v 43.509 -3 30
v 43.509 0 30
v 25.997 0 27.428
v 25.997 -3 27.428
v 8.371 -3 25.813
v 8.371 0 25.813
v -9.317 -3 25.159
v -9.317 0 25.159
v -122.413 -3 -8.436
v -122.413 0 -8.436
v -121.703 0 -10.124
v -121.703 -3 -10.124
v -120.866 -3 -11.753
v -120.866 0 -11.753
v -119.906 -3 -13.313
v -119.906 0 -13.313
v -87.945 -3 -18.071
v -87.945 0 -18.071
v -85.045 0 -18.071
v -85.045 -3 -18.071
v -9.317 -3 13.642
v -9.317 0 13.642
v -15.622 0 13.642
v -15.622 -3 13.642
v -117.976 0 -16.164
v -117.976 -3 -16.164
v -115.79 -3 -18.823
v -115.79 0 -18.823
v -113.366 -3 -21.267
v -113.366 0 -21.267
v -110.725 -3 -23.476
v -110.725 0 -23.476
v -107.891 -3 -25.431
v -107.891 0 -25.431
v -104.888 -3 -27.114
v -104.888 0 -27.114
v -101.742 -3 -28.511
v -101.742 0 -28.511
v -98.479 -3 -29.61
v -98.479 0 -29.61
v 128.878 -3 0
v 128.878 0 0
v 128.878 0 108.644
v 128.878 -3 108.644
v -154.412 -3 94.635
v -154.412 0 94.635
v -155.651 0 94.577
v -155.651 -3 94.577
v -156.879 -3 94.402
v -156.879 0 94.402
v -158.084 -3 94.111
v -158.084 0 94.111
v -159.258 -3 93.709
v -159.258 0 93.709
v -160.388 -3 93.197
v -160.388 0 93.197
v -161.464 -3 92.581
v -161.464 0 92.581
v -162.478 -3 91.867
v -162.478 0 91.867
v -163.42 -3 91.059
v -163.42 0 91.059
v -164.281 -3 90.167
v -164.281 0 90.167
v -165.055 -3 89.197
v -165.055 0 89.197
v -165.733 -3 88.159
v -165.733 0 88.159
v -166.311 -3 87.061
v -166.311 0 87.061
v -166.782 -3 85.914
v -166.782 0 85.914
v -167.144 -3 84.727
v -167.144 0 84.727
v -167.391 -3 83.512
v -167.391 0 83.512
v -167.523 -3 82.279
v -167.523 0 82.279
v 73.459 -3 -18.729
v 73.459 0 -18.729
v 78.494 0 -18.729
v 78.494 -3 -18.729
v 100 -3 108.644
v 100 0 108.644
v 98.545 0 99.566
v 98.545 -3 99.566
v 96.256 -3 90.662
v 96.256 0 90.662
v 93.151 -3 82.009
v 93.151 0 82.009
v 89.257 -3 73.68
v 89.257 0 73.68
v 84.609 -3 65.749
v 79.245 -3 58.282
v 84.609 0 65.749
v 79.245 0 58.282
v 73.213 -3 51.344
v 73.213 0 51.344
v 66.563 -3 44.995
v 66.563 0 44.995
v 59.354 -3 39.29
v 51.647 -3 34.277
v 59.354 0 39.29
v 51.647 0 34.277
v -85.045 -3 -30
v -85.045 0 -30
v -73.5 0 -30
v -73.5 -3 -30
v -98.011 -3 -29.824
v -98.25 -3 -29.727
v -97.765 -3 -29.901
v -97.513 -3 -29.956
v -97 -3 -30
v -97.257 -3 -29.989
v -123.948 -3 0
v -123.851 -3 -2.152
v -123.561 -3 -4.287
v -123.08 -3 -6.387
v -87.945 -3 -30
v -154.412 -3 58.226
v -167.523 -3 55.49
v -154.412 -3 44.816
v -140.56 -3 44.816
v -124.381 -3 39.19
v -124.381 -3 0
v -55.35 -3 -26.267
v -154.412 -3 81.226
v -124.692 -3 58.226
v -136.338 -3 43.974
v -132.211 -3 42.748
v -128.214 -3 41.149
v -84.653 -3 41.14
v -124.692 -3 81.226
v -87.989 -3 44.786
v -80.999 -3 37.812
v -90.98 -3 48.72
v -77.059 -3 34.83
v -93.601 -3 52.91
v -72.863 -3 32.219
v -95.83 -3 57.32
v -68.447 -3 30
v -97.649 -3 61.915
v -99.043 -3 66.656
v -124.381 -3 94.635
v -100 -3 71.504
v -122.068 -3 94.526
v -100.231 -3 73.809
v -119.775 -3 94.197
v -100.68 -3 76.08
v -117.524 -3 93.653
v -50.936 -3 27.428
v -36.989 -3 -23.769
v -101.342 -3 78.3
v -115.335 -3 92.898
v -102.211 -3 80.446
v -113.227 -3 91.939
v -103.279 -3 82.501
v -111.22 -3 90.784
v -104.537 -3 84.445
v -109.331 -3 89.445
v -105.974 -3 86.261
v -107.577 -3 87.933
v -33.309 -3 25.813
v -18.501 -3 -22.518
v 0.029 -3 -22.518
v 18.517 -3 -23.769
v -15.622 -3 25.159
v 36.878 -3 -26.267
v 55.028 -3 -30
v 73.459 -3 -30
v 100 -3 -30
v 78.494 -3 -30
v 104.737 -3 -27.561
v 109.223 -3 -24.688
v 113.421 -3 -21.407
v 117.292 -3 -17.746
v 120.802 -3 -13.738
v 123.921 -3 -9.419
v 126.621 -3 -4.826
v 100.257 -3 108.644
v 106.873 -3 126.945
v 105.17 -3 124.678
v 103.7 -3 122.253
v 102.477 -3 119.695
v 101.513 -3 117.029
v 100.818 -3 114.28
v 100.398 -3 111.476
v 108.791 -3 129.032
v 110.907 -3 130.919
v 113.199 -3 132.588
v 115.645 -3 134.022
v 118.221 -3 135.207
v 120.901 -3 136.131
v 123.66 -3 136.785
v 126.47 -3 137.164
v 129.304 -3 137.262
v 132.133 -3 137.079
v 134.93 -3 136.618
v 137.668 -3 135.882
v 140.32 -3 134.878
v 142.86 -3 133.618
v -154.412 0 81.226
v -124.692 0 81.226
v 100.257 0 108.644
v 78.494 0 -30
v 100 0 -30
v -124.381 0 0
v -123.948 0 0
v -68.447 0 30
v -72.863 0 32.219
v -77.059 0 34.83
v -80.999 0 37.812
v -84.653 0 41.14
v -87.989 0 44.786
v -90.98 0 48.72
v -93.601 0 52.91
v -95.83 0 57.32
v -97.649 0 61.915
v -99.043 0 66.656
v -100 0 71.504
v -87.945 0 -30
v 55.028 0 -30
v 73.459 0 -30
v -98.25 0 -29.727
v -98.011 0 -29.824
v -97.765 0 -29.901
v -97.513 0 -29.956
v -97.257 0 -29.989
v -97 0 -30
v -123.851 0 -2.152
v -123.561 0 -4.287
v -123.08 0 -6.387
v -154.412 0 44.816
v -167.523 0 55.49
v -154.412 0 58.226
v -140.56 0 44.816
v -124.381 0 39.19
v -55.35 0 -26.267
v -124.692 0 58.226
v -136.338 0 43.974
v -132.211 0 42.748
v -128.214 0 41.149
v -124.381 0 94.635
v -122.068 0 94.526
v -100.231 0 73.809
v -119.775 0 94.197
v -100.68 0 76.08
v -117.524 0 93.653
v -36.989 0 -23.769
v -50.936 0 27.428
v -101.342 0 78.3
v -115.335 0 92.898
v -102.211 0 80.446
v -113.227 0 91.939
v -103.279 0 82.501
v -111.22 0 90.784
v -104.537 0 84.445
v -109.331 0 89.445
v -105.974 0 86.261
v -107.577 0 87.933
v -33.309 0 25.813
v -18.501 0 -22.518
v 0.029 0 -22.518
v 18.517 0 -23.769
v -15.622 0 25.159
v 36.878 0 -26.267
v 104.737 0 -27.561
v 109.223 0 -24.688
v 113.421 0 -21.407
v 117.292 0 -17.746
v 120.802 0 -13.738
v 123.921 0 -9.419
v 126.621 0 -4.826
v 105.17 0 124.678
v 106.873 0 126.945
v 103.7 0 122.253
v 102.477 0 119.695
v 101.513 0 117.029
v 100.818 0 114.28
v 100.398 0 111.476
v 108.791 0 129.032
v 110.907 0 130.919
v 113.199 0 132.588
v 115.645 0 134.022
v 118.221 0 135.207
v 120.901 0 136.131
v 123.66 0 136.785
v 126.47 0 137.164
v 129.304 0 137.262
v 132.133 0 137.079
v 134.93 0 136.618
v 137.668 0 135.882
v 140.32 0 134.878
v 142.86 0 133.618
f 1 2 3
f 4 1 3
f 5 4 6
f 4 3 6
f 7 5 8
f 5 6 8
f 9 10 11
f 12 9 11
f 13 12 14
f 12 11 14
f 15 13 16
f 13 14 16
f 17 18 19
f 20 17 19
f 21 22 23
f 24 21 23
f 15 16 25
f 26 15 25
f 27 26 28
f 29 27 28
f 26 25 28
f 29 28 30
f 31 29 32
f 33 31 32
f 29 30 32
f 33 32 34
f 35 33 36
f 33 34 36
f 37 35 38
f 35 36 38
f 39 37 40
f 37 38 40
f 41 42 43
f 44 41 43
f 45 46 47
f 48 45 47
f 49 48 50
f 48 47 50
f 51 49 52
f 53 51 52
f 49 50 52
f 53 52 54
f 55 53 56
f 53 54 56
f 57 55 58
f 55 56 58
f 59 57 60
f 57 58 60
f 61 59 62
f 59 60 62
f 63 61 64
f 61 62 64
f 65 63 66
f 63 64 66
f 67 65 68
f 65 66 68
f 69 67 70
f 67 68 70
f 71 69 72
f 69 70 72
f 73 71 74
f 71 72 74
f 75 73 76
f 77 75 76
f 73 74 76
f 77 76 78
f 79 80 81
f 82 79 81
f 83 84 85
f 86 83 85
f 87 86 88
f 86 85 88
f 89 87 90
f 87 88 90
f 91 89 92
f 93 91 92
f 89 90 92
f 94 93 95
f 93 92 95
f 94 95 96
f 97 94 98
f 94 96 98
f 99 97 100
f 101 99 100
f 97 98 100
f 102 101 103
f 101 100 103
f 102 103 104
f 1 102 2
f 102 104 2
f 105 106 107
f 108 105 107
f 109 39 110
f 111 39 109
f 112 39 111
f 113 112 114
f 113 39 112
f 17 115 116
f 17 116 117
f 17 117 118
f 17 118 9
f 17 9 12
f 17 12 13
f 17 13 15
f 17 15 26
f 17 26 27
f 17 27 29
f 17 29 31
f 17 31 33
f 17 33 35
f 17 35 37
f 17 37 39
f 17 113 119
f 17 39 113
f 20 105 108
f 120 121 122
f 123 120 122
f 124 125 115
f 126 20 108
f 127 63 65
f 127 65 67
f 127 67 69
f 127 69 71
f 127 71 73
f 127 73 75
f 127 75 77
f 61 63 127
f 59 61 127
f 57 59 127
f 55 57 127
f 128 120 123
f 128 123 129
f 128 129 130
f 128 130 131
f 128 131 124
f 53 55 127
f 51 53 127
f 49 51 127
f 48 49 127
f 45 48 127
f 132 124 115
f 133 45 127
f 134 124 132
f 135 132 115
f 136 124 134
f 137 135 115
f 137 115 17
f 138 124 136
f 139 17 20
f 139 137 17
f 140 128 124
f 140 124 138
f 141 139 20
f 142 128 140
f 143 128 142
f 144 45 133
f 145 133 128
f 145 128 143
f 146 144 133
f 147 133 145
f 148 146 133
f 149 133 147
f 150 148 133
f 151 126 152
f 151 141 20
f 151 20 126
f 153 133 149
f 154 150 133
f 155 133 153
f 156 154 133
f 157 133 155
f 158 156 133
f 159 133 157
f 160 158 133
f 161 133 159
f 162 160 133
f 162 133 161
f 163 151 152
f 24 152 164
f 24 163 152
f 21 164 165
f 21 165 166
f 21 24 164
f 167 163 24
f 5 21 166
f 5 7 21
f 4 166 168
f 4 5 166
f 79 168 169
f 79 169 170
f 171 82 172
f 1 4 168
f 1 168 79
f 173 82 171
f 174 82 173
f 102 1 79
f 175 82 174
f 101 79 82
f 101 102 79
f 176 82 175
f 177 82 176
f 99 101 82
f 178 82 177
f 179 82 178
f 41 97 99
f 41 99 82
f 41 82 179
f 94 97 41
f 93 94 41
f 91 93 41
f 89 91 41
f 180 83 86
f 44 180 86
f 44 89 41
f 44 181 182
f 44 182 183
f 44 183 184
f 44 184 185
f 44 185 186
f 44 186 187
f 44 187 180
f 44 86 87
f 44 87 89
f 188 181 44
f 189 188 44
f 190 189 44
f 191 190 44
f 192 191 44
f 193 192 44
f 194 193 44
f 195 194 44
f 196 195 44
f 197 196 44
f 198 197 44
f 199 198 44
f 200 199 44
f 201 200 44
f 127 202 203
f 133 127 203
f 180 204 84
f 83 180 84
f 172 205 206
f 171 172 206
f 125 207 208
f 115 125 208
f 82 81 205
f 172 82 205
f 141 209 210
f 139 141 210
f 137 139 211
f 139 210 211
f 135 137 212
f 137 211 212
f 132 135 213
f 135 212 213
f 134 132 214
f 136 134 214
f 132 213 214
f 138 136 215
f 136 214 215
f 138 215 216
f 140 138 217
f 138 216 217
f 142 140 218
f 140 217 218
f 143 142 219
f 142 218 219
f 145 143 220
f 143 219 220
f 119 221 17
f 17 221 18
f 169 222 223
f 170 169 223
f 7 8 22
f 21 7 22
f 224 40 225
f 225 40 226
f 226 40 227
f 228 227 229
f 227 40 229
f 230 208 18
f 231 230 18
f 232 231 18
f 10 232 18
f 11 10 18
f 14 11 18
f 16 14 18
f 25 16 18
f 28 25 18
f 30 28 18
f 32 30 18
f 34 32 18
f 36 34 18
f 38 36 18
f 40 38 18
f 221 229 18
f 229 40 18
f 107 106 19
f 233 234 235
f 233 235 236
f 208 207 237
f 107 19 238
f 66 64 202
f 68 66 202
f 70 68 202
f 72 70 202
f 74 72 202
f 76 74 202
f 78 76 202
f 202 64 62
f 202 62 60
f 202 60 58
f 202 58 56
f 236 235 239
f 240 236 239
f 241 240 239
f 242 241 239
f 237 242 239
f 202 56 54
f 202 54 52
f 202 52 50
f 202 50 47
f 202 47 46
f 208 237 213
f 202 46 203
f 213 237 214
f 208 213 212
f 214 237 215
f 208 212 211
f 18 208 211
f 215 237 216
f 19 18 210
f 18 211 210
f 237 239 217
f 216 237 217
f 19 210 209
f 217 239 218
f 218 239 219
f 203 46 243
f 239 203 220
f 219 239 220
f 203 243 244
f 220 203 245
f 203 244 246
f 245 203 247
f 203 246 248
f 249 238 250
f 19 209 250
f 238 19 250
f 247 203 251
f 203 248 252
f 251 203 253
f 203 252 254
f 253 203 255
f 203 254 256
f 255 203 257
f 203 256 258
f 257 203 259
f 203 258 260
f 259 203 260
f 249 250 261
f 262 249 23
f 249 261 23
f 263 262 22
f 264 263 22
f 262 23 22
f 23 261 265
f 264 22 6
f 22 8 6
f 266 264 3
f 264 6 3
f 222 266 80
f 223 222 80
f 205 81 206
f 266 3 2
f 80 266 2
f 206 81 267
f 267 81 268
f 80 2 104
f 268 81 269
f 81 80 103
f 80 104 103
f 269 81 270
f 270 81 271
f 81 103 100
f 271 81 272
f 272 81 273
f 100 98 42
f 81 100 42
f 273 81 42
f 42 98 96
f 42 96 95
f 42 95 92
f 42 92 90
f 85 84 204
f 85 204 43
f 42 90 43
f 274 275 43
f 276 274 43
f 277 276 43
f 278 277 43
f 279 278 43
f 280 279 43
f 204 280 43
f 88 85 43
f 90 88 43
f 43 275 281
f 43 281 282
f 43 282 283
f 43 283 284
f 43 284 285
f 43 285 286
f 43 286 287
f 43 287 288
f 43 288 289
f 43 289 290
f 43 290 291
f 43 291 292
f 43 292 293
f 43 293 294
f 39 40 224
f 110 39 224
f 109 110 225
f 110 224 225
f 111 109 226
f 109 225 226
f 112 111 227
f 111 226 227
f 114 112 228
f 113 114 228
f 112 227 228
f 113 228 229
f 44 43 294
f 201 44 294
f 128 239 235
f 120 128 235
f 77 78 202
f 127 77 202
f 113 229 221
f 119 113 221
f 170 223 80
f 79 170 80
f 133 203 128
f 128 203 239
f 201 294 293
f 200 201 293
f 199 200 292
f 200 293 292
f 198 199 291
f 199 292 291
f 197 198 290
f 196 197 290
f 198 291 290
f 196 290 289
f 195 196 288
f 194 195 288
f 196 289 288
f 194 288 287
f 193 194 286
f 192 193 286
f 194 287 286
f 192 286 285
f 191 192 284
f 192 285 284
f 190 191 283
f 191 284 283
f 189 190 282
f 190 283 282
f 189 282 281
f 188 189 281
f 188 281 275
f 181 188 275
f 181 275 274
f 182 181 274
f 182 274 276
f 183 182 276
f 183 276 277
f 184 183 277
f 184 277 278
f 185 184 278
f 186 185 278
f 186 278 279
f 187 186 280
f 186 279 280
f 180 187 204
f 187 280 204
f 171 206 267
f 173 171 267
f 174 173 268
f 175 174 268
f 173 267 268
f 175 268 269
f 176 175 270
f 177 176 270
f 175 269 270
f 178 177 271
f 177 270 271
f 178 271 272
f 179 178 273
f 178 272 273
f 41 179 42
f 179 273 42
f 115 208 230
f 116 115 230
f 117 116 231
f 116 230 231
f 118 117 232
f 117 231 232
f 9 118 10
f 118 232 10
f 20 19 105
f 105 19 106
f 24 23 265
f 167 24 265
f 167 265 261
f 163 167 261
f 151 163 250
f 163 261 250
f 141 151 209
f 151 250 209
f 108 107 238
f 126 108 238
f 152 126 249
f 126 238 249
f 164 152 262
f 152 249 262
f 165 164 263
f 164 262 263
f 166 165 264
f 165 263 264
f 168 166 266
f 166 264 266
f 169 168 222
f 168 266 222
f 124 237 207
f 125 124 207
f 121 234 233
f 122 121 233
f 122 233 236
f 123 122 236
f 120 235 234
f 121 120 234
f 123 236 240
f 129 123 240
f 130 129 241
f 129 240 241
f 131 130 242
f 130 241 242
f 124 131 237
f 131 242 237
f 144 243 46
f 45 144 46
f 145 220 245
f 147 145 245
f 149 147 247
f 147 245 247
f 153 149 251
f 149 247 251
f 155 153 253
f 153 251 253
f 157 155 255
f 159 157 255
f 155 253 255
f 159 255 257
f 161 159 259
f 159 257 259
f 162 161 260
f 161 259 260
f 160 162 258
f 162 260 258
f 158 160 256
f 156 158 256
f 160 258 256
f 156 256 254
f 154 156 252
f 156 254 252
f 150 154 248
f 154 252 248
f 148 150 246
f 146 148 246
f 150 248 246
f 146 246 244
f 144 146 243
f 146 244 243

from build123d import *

# Parameters (mm, degrees)
F1_DEPTH = 3


with BuildPart() as f1:
    # F0 (on Front) → F1 (new body)
    with BuildSketch(Plane.XZ):
        with BuildLine():
            Line((-100, 71.5043097734), (-100, 30))
            Line((-100, 30), (-68.4474930168, 30))
            ThreePointArc((-68.4474930168, 30), (-89.5290711605, 46.7189281194), (-100, 71.5043097734))
        make_face()
        with BuildLine():
            Line((-68.4474930168, 30), (-100, 30))
            Line((-100, 30), (-100, 23.9479522939))
            ThreePointArc((-100, 23.9479522939), (-77.4009003412, 7.9237058049), (-85.0451834083, -18.7044882255))
            Line((-85.0451834083, -18.7044882255), (-85.0451834083, -30))
            Line((-85.0451834083, -30), (-73.4999999404, -30))
            ThreePointArc((-73.4999999404, -30), (-9.236112237, -22.3609557327), (55.0277754664, -30))
            Line((55.0277754664, -30), (73.458686471, -30))
            Line((73.458686471, -30), (73.458686471, -18.7292341143))
            Line((73.458686471, -18.7292341143), (78.4938633442, -18.7292341143))
            Line((78.4938633442, -18.7292341143), (78.4938633442, -30))
            Line((78.4938633442, -30), (100, -30))
            Line((100, -30), (100, 0))
            Line((100, 0), (100, 30))
            Line((100, 30), (43.509118259, 30))
            ThreePointArc((43.509118259, 30), (17.1951254295, 26.500256647), (-9.3166837469, 25.1592136325))
            Line((-9.3166837469, 25.1592136325), (-9.3166837469, 13.6418417096))
            Line((-9.3166837469, 13.6418417096), (-15.6216910109, 13.6418417096))
            Line((-15.6216910109, 13.6418417096), (-15.6216910109, 25.1592136325))
            ThreePointArc((-15.6216910109, 25.1592136325), (-42.1335001872, 26.500256647), (-68.4474930168, 30))
        make_face()
        with BuildLine():
            Line((-100, 23.9479522939), (-100, 30))
            Line((-100, 30), (-100, 71.5043097734))
            Line((-100, 71.5043097734), (-124.3806779385, 71.5043097734))
            Line((-124.3806779385, 71.5043097734), (-124.3806779385, 44.8159986225))
            Line((-124.3806779385, 44.8159986225), (-124.3806779385, 39.189517498))
            Line((-124.3806779385, 39.189517498), (-124.3806779385, 0))
            Line((-124.3806779385, 0), (-123.9479522939, 0))
            ThreePointArc((-123.9479522939, 0), (-116.9337594626, 16.9337594626), (-100, 23.9479522939))
        make_face()
        with BuildLine():
            ThreePointArc((-85.0451834083, -18.7044882255), (-77.4009003412, 7.9237058049), (-100, 23.9479522939))
            Line((-100, 23.9479522939), (-100, 0))
            Line((-100, 0), (-100, -23.9479522939))
            ThreePointArc((-100, -23.9479522939), (-93.7566918243, -23.119808003), (-87.9451834083, -20.6926512562))
            Line((-87.9451834083, -20.6926512562), (-87.9451834083, -18.0708928406))
            Line((-87.9451834083, -18.0708928406), (-85.0451834083, -18.0708928406))
            Line((-85.0451834083, -18.0708928406), (-85.0451834083, -18.7044882255))
        make_face()
        with BuildLine():
            Line((-100, 0), (-100, 23.9479522939))
            ThreePointArc((-100, 23.9479522939), (-116.9337594626, 16.9337594626), (-123.9479522939, 0))
            Line((-123.9479522939, 0), (-100, 0))
        make_face()
        with BuildLine():
            Line((-124.3806779385, 71.5043097734), (-100, 71.5043097734))
            ThreePointArc((-100, 71.5043097734), (-107.5768900996, 87.9325587369), (-124.3806779385, 94.6354940534))
            Line((-124.3806779385, 94.6354940534), (-124.3806779385, 71.5043097734))
        make_face()
        with BuildLine():
            Line((-100, -23.9479522939), (-100, 0))
            Line((-100, 0), (-123.9479522939, 0))
            ThreePointArc((-123.9479522939, 0), (-123.561080085, -4.2871813932), (-122.4129630745, -8.4358464478))
            ThreePointArc((-122.4129630745, -8.4358464478), (-121.2500665042, -10.9208672377), (-119.9064756979, -13.3130253647))
            ThreePointArc((-119.9064756979, -13.3130253647), (-111.2846072761, -21.1225485606), (-100, -23.9479522939))
        make_face()
        Polygon((-124.3806779385, 44.8159986225), (-124.3806779385, 71.5043097734), (-124.3806779385, 94.6354940534), (-154.4115646049, 94.6354940534), (-154.4115646049, 81.2257463379), (-124.6924658106, 81.2257463379), (-124.6924658106, 58.2257463379), (-154.4115646049, 58.2257463379), (-154.4115646049, 44.8159986225), (-140.5599779571, 44.8159986225), align=None)
        with BuildLine():
            ThreePointArc((-87.9451834083, -20.6926512562), (-93.7566918243, -23.119808003), (-100, -23.9479522939))
            Line((-100, -23.9479522939), (-100, -27))
            ThreePointArc((-100, -27), (-99.5920709422, -28.5103536773), (-98.4792211797, -29.6099625862))
            ThreePointArc((-98.4792211797, -29.6099625862), (-97.7416237075, -29.812616064), (-97, -30))
            Line((-97, -30), (-87.9451834083, -30))
            Line((-87.9451834083, -30), (-87.9451834083, -20.6926512562))
        make_face()
        with BuildLine():
            Line((-100, -27), (-100, -23.9479522939))
            ThreePointArc((-100, -23.9479522939), (-111.2846072761, -21.1225485606), (-119.9064756979, -13.3130253647))
            ThreePointArc((-119.9064756979, -13.3130253647), (-110.7252490766, -23.4762982325), (-98.4792211797, -29.6099625862))
            ThreePointArc((-98.4792211797, -29.6099625862), (-99.5920709422, -28.5103536773), (-100, -27))
        make_face()
        with BuildLine():
            ThreePointArc((-119.9064756979, -13.3130253647), (-121.2500665042, -10.9208672377), (-122.4129630745, -8.4358464478))
            ThreePointArc((-122.4129630745, -8.4358464478), (-121.2997756573, -10.946413843), (-119.9064756979, -13.3130253647))
        make_face()
        with BuildLine():
            Line((-124.3806779385, 39.189517498), (-124.3806779385, 44.8159986225))
            Line((-124.3806779385, 44.8159986225), (-140.5599779571, 44.8159986225))
            ThreePointArc((-140.5599779571, 44.8159986225), (-132.2111646691, 42.7479983529), (-124.3806779385, 39.189517498))
        make_face()
        with BuildLine():
            Line((-154.4115646049, 81.2257463379), (-154.4115646049, 94.6354940534))
            ThreePointArc((-154.4115646049, 94.6354940534), (-163.4199195991, 91.0594551964), (-167.5229668617, 82.2785943747))
            Line((-167.5229668617, 82.2785943747), (-154.4115646049, 81.2257463379))
        make_face()
        with BuildLine():
            ThreePointArc((-97, -30), (-97.7416237075, -29.812616064), (-98.4792211797, -29.6099625862))
            ThreePointArc((-98.4792211797, -29.6099625862), (-97.7648896134, -29.9008522678), (-97, -30))
        make_face()
        Polygon((-167.5229668617, 55.4901845753), (-154.4115646049, 44.8159986225), (-154.4115646049, 58.2257463379), align=None)
        with BuildLine():
            ThreePointArc((100, 108.6442619568), (82.0137314179, 61.9528751155), (43.509118259, 30))
            Line((43.509118259, 30), (100, 30))
            Line((100, 30), (100, 108.6442619568))
        make_face()
        with BuildLine():
            ThreePointArc((100.2573479135, 108.64405), (100.1286740004, 108.6442089676), (100, 108.6442619568))
            Line((100, 108.6442619568), (100, 30))
            Line((100, 30), (100, 0))
            Line((100, 0), (128.8781613111, 0))
            Line((128.8781613111, 0), (128.8781613111, 80.0234485584))
            ThreePointArc((128.8781613111, 80.0234485584), (108.6402650122, 88.4062157818), (100.2573479135, 108.64405))
        make_face()
        with BuildLine():
            Line((100.2573479127, 108.6442619568), (100, 108.6442619568))
            ThreePointArc((100, 108.6442619568), (100.1286740004, 108.6442089676), (100.2573479135, 108.64405))
            ThreePointArc((100.2573479135, 108.64405), (100.2573479129, 108.6441559784), (100.2573479127, 108.6442619568))
        make_face()
        with BuildLine():
            ThreePointArc((142.8596985833, 133.6175992408), (114.4042539206, 133.3354944988), (100.2573479127, 108.6442619568))
            Line((100.2573479127, 108.6442619568), (128.8781613111, 108.6442619568))
            Line((128.8781613111, 108.6442619568), (142.8596985833, 133.6175992408))
        make_face()
        with BuildLine():
            Line((128.8781613111, 108.6442619568), (100.2573479127, 108.6442619568))
            ThreePointArc((100.2573479127, 108.6442619568), (100.2573479129, 108.6441559784), (100.2573479135, 108.64405))
            ThreePointArc((100.2573479135, 108.64405), (114.6298030847, 107.9577659942), (128.8781613111, 105.9520887429))
            Line((128.8781613111, 105.9520887429), (128.8781613111, 108.6442619568))
        make_face()
        with BuildLine():
            ThreePointArc((128.8781613111, 105.9520887429), (114.6298030847, 107.9577659942), (100.2573479135, 108.64405))
            ThreePointArc((100.2573479135, 108.64405), (108.6402650122, 88.4062157818), (128.8781613111, 80.0234485584))
            Line((128.8781613111, 80.0234485584), (128.8781613111, 105.9520887429))
        make_face()
        with BuildLine():
            Line((128.8781613111, 0), (100, 0))
            Line((100, 0), (100, -30))
            ThreePointArc((100, -30), (117.2918939431, -17.7461334103), (128.8781613111, 0))
        make_face()
    extrude(amount=F1_DEPTH)


solid = f1.part
